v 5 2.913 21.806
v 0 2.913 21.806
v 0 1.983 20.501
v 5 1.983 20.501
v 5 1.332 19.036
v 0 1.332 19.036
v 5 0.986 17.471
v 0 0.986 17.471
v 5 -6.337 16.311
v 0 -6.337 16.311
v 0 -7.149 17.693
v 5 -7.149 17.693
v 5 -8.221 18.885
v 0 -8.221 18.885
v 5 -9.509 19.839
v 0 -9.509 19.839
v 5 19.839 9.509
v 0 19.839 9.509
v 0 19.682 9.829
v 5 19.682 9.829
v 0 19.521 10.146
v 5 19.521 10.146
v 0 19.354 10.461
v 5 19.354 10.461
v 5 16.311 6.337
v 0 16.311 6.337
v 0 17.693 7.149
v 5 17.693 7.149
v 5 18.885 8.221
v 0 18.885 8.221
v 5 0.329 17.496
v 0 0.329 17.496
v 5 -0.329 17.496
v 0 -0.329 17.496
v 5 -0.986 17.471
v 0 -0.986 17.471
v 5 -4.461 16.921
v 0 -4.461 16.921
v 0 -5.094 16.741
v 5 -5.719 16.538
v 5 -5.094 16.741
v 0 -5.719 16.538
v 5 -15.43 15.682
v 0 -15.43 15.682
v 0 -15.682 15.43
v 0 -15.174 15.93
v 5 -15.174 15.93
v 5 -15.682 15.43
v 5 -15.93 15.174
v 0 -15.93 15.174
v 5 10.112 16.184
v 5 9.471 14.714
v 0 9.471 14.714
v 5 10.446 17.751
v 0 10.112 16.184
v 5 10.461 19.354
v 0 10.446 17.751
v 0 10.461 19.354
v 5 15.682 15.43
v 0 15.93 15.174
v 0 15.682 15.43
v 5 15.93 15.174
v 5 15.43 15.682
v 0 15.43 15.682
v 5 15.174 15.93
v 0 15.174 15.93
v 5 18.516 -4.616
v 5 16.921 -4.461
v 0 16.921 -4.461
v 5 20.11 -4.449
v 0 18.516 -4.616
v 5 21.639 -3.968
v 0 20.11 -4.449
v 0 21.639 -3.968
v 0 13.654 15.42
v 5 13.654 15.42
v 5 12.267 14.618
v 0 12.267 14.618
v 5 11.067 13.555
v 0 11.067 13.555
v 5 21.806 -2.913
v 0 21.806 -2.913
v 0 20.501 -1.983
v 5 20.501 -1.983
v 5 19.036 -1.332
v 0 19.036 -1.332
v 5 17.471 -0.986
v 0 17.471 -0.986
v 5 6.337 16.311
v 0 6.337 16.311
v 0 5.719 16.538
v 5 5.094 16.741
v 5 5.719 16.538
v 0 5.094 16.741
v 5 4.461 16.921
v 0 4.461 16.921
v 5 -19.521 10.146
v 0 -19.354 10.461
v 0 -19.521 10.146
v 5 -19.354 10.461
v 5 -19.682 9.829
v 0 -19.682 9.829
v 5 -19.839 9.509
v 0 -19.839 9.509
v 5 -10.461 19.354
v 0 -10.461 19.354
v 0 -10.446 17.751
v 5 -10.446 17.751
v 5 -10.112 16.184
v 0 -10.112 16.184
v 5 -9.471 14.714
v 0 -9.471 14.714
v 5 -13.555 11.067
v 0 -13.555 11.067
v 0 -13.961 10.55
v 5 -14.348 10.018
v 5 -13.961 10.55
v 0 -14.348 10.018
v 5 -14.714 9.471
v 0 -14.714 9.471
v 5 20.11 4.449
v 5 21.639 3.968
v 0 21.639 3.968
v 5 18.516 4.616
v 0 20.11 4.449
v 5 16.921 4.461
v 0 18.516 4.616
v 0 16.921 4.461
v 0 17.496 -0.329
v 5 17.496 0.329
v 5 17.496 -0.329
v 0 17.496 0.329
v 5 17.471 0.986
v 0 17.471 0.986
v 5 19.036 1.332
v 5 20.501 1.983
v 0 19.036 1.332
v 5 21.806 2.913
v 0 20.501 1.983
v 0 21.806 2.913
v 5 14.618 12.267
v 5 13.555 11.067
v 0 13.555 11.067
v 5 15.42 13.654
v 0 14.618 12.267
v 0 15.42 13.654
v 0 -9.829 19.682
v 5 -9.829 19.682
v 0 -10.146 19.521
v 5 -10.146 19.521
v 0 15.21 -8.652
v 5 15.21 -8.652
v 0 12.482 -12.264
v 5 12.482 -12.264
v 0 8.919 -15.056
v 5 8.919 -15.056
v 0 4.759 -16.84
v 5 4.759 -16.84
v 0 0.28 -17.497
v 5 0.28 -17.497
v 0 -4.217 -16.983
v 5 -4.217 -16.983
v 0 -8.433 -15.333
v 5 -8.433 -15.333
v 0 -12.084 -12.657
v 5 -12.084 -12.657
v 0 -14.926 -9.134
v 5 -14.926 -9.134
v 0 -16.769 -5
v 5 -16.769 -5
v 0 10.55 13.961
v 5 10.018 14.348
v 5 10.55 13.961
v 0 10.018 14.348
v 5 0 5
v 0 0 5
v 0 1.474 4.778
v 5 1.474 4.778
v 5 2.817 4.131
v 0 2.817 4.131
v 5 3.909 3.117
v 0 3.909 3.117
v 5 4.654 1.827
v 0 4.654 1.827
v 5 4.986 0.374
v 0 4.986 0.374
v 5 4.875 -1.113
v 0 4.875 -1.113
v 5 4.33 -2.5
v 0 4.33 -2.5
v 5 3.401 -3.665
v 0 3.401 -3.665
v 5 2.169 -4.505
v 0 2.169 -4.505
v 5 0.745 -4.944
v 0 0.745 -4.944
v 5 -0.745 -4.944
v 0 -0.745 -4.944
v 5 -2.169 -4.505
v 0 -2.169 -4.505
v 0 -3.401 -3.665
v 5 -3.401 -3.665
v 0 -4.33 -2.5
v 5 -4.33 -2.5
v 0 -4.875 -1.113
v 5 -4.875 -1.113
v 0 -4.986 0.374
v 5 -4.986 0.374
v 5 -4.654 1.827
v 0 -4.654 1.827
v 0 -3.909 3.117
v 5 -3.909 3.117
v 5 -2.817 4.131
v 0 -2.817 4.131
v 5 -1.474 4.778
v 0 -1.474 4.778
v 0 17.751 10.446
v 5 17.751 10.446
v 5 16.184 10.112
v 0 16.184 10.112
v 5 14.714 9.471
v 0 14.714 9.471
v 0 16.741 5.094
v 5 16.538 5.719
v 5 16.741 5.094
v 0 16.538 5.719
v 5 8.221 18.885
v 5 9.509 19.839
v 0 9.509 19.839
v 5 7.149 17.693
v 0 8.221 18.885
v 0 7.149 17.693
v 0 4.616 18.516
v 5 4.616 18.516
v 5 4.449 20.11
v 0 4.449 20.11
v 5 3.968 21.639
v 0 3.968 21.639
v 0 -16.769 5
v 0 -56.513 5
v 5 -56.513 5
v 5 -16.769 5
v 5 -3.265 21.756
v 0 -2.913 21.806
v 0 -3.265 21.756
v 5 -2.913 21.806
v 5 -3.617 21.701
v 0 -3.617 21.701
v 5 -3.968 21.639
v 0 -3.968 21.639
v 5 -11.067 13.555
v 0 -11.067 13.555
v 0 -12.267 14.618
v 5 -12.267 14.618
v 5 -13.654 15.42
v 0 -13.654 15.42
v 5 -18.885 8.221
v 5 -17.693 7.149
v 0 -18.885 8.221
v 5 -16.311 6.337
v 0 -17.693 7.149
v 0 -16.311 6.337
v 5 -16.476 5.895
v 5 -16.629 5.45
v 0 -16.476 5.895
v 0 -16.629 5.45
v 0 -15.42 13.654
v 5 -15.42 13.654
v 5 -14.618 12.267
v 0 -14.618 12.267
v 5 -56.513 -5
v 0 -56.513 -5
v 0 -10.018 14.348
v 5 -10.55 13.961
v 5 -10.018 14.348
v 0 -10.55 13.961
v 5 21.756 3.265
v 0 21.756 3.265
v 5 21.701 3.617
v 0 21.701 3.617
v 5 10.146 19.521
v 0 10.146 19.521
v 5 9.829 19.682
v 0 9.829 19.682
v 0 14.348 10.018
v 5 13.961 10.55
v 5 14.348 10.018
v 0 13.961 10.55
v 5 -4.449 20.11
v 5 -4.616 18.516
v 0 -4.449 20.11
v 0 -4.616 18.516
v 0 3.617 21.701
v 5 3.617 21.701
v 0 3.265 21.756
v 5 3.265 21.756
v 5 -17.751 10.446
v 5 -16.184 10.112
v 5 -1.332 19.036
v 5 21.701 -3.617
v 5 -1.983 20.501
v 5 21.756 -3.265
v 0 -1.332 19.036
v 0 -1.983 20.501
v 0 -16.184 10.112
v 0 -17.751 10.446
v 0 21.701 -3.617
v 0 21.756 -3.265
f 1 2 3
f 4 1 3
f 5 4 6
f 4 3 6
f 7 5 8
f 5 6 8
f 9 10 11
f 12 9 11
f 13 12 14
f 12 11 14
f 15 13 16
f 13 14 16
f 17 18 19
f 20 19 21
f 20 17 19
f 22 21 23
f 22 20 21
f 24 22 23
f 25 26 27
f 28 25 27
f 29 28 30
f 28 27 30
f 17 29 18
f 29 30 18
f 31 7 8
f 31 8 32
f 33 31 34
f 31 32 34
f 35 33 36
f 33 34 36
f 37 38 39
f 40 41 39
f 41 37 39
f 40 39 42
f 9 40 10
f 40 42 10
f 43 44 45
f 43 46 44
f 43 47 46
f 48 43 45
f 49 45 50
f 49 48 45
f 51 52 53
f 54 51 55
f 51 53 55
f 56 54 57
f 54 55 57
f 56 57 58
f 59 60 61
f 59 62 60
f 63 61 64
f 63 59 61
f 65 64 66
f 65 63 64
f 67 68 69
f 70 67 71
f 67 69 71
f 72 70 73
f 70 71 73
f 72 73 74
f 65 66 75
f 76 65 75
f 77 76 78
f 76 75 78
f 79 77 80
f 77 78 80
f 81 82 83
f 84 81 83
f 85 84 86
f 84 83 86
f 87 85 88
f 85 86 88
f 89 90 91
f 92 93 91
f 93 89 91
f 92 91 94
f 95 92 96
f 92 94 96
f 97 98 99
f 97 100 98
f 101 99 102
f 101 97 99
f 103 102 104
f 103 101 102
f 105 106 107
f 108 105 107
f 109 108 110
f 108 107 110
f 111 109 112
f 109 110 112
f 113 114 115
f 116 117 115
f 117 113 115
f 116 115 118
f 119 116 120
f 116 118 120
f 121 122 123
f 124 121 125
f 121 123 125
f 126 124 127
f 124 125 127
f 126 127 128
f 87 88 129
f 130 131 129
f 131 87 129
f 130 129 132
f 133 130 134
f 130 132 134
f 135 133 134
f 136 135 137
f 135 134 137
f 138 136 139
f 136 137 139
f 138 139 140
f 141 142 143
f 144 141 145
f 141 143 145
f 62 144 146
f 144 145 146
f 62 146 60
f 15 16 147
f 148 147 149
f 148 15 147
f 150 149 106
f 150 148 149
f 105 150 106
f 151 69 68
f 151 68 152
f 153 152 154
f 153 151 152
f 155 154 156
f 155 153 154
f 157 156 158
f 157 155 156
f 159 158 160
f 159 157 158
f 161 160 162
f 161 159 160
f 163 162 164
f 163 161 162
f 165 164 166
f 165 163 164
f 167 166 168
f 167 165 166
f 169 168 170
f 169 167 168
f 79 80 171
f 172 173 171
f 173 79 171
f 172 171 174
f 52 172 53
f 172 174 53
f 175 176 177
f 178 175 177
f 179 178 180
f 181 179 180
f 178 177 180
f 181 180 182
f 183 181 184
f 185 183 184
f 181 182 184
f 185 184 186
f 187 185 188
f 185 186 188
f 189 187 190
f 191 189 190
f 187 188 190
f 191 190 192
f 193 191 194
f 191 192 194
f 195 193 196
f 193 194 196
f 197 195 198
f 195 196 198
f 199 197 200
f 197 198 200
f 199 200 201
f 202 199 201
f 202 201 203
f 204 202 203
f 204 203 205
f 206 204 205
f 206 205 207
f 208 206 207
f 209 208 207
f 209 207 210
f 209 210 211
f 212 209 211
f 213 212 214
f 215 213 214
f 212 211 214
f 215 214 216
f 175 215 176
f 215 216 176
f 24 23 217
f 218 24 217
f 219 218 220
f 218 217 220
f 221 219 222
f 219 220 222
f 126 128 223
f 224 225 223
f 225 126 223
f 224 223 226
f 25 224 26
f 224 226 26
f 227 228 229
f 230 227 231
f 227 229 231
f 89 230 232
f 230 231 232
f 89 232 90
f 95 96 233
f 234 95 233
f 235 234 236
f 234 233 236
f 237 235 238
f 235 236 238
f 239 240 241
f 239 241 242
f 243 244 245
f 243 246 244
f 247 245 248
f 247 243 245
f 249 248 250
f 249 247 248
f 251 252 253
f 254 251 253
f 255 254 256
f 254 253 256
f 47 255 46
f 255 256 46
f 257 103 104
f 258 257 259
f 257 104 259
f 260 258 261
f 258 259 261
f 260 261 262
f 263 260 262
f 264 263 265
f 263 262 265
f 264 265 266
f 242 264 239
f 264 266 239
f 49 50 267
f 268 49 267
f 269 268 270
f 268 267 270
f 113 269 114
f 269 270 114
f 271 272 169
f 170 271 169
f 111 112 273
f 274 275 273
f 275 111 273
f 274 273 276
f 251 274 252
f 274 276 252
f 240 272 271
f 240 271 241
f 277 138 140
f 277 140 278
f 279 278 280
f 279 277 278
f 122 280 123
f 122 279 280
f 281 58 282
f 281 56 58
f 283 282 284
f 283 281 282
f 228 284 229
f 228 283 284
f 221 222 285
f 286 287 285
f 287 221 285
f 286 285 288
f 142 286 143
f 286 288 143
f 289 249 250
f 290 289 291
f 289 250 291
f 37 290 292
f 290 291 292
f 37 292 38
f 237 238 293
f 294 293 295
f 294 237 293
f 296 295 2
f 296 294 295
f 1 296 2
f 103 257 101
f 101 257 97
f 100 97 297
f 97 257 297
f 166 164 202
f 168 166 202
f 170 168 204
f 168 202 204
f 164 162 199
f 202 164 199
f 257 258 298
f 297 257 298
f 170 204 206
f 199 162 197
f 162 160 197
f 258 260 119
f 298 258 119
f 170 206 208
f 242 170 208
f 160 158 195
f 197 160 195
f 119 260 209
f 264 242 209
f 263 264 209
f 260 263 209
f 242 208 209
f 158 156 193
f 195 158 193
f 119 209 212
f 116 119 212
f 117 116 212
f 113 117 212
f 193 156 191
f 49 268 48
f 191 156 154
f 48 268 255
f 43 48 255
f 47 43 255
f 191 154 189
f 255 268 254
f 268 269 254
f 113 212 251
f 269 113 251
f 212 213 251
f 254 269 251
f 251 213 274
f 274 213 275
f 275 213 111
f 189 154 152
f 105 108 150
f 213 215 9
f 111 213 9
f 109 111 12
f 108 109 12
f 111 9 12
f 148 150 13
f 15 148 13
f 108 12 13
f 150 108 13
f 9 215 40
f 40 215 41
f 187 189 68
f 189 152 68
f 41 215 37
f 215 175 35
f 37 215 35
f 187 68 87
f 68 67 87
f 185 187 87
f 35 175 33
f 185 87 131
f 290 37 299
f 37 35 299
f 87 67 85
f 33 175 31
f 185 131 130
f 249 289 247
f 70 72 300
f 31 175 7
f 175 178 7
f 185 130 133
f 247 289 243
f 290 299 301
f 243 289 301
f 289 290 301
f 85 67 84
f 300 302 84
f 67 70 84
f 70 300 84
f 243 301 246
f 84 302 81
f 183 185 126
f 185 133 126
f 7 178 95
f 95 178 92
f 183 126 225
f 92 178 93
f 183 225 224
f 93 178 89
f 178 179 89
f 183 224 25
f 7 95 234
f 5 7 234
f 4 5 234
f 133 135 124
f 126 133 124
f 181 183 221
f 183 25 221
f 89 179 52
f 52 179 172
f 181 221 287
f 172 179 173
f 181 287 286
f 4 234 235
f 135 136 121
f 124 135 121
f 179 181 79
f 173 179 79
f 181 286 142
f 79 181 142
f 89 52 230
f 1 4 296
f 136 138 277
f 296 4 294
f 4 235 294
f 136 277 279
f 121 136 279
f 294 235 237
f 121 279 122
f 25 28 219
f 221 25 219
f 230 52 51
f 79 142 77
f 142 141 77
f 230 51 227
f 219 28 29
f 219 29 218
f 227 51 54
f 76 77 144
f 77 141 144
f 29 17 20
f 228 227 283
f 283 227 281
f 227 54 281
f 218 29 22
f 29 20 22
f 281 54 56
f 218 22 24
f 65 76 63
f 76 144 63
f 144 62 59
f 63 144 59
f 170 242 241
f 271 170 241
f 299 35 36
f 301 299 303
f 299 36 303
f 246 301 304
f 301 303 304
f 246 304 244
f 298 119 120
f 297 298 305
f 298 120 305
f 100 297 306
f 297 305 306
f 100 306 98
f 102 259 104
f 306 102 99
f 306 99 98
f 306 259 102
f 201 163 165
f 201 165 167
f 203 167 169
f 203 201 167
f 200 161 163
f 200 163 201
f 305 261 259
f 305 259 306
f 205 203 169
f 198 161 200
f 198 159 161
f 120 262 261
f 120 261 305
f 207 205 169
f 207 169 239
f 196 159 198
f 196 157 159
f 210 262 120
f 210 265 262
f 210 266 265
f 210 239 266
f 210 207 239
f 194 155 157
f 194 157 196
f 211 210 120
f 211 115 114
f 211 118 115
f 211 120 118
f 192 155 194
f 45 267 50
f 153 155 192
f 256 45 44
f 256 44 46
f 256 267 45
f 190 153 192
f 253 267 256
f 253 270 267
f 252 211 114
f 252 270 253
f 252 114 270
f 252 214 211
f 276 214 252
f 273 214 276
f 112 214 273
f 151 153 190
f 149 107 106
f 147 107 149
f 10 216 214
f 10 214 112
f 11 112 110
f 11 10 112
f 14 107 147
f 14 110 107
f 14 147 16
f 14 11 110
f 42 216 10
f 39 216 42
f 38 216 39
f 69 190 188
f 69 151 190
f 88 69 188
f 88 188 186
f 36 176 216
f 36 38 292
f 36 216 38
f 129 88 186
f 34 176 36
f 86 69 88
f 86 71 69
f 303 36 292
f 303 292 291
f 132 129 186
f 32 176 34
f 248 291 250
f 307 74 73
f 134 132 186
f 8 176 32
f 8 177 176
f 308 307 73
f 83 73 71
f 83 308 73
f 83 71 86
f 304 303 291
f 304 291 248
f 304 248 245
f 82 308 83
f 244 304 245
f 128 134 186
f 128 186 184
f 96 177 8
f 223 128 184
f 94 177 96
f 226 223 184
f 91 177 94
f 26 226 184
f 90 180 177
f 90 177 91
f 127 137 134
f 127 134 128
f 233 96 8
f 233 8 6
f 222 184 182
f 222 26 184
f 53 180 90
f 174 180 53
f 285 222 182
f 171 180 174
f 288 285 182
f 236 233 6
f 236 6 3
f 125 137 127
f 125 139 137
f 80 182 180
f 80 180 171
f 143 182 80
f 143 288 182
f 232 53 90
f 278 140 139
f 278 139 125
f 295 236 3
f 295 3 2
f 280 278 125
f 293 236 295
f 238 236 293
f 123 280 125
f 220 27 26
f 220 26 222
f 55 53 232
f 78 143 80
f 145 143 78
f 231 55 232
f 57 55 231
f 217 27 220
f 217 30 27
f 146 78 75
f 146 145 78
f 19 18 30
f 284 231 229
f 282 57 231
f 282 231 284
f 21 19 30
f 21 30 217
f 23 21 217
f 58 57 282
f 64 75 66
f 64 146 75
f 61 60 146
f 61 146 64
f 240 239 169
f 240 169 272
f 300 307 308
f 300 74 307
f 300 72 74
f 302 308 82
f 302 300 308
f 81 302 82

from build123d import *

# Parameters (mm, degrees)
BASPROSKE_W         = 5
BASPROSKE_H         = 22
TOOTHCUT_DEPTH      = 32.511902513
TEETHCUTS_COUNT     = 20
TEETHCUTS_ANGLE     = 342
BORSKE_R            = 2
BORE_DEPTH          = 50.0000508
SKETCH1_W           = 10
SKETCH1_H           = 40
BOSS_EXTRUDE1_DEPTH = 5
CUT_EXTRUDE1_DEPTH  = 61.779759056
SKETCH4_R           = 17.499
BOSS_EXTRUDE2_DEPTH = 5
SKETCH5_R           = 5
CUT_EXTRUDE2_DEPTH  = 5


with BuildPart() as part:
    # BasProSke → Base-Revolve (revolve)
    with BuildSketch(Plane(origin=(0, 0, 0), x_dir=(1, 0, 0), z_dir=(0, 1, 0)), mode=Mode.PRIVATE) as base_revolve_sk:
        with Locations((2.5, 11)):
            Rectangle(BASPROSKE_W, BASPROSKE_H)
    revolve(base_revolve_sk.sketch.rotate(Axis((-10, 0, 0), (1, 0, 0)), 180), axis=Axis((-10, 0, 0), (1, 0, 0)))

    # TooCutSke → ToothCut (cut, through all)
    with BuildSketch(Plane(origin=(0, 0, 0), x_dir=(0, 0, -1), z_dir=(1, 0, 0))):
        with BuildLine():
            ThreePointArc((0.986171591, 17.471189616), (0, 17.499), (-0.986171591, 17.471189616))
            ThreePointArc((-0.986171591, 17.471189616), (-1.626916196, 19.798789858), (-2.932850173, 21.829260982))
            ThreePointArc((-2.932850173, 21.829260982), (0, 22.0254), (2.932850173, 21.829260982))
            ThreePointArc((2.932850173, 21.829260982), (1.626916196, 19.798789858), (0.986171591, 17.471189616))
        make_face()
    toothcut = extrude(amount=TOOTHCUT_DEPTH, mode=Mode.SUBTRACT)

    # TeethCuts: ToothCut ×20 about axis
    teethcuts_axis = Axis((-10, 0, 0), (1, 0, 0))
    for i in range(1, TEETHCUTS_COUNT):
        add(toothcut.rotate(teethcuts_axis, i * TEETHCUTS_ANGLE / (TEETHCUTS_COUNT - 1)), mode=Mode.SUBTRACT)

    # BorSke → Bore (cut, symmetric)
    with BuildSketch(Plane(origin=(0, 0, 0), x_dir=(0, 0, -1), z_dir=(1, 0, 0))):
        with Locations(Location((0, 0, 0), (0, 0, 180))):
            Circle(BORSKE_R)
    extrude(amount=BORE_DEPTH, both=True, mode=Mode.SUBTRACT)

    # Sketch1 → Boss-Extrude1 (add)
    with BuildSketch(Plane.ZY):
        with Locations((0, -36.512502254)):
            Rectangle(SKETCH1_W, SKETCH1_H)
    extrude(amount=-BOSS_EXTRUDE1_DEPTH)

    # Sketch2 → Cut-Extrude1 (cut, through all)
    with BuildSketch(Plane.ZY):
        Polygon((-5, -16.76946633), (-4.460989585, 16.920832513), (-7.792643155, 24.285727196), (-28.634173903, 9.783095201), (-18.213408529, -22.103486404), (-10.962092532, -23.448101291), align=None)
    extrude(amount=-CUT_EXTRUDE1_DEPTH, mode=Mode.SUBTRACT)

    # Sketch4 → Boss-Extrude2 (add)
    with BuildSketch(Plane.ZY):
        Circle(SKETCH4_R)
    extrude(amount=-BOSS_EXTRUDE2_DEPTH)

    # Sketch5 → Cut-Extrude2 (cut)
    with BuildSketch(Plane.ZY):
        Circle(SKETCH5_R)
    extrude(amount=-CUT_EXTRUDE2_DEPTH, mode=Mode.SUBTRACT)


solid = part.part
